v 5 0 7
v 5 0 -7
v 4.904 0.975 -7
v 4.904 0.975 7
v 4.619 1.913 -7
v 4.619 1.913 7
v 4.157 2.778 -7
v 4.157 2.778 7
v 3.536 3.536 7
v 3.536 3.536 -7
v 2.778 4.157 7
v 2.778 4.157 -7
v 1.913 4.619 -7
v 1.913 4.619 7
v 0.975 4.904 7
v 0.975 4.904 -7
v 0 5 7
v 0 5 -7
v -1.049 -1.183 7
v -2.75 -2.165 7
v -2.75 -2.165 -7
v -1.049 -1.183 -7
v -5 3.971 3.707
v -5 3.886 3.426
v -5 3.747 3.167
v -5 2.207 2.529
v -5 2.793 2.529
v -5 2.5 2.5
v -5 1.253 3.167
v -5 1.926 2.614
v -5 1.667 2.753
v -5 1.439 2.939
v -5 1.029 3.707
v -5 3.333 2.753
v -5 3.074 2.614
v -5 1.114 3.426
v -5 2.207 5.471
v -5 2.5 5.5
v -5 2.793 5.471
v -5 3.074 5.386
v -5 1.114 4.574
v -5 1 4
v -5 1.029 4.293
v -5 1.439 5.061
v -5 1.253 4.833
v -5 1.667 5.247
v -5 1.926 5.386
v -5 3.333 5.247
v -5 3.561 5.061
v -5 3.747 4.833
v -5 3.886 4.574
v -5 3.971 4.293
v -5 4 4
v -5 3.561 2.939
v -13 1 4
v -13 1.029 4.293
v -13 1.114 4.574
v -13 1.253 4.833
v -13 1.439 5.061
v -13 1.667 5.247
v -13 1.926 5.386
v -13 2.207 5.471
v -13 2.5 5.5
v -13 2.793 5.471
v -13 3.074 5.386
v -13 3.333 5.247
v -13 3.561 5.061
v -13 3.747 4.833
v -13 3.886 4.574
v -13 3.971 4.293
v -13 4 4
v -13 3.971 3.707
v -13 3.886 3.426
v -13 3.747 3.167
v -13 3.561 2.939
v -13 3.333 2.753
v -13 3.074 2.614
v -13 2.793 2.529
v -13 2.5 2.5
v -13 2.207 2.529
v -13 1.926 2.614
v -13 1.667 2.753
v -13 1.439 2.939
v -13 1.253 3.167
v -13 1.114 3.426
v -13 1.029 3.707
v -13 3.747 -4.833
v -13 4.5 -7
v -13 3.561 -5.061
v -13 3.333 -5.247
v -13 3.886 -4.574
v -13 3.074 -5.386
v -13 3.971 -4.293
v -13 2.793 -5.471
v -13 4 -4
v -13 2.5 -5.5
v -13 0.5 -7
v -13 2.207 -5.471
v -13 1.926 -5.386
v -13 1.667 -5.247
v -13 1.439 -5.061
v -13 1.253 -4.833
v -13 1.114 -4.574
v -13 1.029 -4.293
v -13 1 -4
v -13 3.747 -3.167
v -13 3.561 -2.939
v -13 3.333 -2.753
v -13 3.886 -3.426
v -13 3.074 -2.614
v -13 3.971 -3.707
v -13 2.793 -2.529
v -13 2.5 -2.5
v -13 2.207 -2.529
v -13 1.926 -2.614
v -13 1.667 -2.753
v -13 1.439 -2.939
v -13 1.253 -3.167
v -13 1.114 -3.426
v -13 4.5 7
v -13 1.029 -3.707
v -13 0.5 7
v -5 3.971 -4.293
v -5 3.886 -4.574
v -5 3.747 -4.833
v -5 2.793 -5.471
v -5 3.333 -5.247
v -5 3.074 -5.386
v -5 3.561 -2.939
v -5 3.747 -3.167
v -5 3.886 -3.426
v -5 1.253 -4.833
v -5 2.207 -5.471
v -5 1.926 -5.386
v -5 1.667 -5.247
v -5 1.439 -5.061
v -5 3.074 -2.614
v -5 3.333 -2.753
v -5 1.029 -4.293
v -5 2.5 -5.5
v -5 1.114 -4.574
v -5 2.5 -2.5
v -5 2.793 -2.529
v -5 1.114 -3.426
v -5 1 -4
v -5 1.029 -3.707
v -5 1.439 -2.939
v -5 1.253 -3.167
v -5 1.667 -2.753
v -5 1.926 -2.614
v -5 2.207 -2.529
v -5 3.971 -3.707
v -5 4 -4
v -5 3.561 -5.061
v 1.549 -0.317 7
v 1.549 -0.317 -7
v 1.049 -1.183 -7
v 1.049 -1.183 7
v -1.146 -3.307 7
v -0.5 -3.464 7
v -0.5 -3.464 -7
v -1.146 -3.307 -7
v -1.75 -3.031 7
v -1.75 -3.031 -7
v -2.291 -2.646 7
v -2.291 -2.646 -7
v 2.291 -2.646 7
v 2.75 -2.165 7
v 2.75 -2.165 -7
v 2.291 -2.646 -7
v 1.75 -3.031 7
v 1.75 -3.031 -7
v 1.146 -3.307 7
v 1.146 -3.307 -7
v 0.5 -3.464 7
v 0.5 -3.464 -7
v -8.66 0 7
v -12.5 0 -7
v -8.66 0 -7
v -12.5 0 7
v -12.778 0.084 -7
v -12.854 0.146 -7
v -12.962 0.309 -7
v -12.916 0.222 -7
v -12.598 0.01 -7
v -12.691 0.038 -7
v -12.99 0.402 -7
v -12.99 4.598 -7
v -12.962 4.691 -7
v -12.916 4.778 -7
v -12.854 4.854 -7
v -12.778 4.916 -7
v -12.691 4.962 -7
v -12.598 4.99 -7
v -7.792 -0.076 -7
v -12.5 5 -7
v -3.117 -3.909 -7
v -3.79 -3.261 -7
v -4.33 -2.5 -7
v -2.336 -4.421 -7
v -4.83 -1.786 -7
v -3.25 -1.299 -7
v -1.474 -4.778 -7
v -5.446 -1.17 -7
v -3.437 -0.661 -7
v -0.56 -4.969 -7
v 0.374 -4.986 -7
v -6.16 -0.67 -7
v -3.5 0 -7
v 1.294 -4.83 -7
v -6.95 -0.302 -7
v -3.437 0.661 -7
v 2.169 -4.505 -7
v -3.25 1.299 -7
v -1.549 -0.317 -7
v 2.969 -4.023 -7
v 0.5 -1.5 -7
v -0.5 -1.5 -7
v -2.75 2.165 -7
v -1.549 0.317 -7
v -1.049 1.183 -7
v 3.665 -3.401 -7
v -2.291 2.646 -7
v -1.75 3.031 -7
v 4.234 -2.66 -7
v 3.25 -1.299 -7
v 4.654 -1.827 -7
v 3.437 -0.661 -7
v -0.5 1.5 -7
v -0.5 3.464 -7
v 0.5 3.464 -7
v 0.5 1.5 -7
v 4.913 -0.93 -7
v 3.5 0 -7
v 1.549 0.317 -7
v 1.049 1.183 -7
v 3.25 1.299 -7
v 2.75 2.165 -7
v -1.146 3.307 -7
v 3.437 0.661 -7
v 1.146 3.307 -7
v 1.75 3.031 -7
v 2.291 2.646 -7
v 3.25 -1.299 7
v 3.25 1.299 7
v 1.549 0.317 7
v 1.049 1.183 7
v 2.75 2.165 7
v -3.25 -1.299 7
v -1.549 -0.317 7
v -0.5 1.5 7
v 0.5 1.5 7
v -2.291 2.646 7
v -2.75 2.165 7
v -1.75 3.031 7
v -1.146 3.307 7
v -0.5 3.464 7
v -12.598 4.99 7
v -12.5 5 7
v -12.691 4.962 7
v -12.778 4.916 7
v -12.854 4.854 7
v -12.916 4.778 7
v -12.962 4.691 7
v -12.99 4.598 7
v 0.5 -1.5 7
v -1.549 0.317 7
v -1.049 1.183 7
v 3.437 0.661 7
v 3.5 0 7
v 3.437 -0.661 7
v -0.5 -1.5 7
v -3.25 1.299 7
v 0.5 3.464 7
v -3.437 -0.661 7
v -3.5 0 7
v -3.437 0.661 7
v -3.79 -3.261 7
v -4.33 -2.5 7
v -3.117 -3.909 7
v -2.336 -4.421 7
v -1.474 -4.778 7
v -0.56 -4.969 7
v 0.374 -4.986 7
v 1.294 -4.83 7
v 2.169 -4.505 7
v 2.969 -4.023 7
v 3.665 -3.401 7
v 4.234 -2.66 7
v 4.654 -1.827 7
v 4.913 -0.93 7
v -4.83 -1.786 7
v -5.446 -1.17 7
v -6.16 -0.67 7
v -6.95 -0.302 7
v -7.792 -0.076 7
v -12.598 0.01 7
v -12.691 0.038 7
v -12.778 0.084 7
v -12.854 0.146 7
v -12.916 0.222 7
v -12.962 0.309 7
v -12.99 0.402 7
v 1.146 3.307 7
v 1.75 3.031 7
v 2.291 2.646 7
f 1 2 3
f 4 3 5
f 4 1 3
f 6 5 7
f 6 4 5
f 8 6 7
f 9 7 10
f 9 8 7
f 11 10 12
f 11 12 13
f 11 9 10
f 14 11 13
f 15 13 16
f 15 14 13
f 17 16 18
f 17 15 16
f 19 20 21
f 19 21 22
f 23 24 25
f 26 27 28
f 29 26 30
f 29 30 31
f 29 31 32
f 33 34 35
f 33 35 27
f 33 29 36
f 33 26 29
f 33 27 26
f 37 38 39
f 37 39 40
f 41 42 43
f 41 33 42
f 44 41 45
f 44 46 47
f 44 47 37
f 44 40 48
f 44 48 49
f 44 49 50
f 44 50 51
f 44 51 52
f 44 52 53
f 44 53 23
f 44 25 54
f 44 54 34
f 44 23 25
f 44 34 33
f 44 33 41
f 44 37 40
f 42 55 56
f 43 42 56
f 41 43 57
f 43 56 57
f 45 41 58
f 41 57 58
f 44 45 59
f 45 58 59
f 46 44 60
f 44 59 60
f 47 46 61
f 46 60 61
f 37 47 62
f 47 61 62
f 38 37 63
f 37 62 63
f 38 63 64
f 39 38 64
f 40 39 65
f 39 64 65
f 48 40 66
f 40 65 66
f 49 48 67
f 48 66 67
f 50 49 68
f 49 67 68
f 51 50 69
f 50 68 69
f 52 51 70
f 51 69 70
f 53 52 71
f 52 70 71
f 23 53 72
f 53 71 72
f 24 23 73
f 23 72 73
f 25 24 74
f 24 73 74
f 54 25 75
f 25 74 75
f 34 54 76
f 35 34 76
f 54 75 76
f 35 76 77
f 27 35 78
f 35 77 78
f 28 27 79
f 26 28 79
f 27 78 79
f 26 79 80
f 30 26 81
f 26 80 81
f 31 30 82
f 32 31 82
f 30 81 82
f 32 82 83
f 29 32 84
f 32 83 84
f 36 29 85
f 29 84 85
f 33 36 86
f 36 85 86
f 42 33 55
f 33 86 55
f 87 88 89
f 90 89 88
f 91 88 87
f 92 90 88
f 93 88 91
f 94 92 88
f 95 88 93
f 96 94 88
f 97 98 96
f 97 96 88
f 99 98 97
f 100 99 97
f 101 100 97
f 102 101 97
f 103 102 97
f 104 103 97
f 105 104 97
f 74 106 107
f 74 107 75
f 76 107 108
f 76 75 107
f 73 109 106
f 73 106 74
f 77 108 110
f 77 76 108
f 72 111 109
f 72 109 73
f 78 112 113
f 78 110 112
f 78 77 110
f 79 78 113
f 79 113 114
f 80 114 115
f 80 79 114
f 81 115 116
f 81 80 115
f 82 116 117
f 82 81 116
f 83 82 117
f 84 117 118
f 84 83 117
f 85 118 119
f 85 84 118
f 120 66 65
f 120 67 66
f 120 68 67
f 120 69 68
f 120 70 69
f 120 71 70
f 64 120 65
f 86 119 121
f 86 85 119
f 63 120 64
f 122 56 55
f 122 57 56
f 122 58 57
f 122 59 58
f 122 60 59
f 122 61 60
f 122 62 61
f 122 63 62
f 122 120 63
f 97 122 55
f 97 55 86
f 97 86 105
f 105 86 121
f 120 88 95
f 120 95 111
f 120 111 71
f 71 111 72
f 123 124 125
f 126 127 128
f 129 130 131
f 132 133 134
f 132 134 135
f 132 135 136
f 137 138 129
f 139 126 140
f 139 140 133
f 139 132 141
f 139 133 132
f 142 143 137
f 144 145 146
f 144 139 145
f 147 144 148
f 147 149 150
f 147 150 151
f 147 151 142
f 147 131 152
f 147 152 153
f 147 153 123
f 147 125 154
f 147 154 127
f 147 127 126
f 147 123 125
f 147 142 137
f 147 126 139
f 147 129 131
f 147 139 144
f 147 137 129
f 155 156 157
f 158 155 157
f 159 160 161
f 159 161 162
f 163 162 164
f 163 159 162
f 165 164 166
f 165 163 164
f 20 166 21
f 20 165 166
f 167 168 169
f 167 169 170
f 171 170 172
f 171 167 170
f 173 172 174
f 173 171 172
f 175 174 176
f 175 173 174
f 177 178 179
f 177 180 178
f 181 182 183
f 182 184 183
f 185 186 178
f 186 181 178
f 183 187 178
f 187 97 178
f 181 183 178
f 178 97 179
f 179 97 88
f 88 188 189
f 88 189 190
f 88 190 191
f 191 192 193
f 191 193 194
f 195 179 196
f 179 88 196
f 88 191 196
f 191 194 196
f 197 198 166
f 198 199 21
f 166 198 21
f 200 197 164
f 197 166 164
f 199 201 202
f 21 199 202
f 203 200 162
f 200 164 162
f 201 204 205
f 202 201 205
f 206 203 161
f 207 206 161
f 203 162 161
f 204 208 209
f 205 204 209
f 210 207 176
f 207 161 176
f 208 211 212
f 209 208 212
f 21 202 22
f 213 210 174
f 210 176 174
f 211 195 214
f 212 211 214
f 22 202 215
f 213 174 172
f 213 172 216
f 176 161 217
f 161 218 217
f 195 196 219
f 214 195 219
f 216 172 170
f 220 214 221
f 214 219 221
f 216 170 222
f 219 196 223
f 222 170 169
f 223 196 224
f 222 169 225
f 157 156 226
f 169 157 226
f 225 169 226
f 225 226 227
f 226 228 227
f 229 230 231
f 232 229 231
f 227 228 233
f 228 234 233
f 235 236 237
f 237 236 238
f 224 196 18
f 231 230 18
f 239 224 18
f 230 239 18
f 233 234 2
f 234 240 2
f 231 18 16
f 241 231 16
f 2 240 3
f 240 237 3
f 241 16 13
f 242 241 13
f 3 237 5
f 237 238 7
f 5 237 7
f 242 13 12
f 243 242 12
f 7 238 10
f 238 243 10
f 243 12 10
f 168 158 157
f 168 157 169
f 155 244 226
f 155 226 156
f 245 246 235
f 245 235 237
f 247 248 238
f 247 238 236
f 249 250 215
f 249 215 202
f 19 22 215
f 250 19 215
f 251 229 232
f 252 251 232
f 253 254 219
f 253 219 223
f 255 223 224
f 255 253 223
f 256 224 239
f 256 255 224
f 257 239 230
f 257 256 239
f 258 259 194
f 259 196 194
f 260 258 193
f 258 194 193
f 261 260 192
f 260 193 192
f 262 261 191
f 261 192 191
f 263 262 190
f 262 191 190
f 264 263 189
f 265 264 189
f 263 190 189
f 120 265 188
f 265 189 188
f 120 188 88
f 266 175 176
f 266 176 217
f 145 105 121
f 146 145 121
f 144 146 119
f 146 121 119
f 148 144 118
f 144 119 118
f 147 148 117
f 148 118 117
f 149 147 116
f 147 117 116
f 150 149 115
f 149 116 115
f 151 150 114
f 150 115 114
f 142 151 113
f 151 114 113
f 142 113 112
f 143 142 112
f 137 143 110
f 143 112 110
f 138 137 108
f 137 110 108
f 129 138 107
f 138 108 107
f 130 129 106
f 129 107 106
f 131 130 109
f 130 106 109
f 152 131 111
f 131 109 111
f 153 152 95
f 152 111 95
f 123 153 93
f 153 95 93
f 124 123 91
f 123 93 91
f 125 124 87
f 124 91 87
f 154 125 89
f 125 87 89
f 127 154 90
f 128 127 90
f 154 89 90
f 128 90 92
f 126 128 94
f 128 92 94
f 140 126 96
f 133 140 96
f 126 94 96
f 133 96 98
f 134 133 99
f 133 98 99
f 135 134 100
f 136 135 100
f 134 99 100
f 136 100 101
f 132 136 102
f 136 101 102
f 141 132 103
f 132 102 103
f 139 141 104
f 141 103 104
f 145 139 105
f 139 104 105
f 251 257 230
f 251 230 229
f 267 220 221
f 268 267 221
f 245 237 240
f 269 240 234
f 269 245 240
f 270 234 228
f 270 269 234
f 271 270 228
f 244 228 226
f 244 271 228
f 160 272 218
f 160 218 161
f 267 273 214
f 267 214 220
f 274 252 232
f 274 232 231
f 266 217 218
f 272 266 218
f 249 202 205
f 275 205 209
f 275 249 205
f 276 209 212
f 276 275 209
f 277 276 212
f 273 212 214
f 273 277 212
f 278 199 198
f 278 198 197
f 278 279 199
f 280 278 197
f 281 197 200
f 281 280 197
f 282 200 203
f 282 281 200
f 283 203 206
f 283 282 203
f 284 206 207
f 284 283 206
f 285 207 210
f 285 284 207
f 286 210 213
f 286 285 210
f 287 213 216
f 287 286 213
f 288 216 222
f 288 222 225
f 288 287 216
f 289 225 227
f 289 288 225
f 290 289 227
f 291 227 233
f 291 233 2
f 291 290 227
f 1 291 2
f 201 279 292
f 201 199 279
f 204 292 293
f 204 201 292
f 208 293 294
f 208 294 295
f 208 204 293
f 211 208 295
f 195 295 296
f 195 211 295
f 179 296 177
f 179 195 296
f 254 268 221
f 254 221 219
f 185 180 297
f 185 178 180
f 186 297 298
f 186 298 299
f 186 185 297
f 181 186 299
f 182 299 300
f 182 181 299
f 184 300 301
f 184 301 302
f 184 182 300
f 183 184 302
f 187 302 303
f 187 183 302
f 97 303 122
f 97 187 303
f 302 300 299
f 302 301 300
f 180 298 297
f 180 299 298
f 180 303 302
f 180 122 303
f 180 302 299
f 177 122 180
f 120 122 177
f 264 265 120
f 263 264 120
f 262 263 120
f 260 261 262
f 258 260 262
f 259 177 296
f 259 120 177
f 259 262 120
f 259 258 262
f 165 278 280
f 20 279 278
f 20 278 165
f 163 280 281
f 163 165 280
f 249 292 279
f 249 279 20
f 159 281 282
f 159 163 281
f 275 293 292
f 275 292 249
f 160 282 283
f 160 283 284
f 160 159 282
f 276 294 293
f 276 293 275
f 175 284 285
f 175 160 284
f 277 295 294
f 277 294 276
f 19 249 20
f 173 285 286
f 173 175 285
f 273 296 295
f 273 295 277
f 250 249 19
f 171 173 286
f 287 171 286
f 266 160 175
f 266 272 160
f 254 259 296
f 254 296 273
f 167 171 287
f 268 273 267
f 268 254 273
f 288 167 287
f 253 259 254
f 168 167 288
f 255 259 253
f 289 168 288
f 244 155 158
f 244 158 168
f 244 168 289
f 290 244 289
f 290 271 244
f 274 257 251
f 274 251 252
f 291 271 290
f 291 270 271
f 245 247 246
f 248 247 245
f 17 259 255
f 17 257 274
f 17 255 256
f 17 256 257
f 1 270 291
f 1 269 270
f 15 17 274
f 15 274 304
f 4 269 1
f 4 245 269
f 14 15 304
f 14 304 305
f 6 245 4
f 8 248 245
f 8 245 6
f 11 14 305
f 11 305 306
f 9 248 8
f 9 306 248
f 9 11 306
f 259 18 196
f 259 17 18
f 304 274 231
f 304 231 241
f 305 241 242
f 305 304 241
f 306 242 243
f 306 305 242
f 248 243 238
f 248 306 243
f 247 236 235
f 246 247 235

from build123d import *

# Parameters (mm, degrees)
F1_DEPTH = 7
F2_R     = 5
F3_R     = 0.5
F4_R     = 1.5
F5_DEPTH = 8


with BuildPart() as f1:
    # F0 (on Top) → F1 (new body, symmetric)
    with BuildSketch(Plane.XY):
        with BuildLine():
            ThreePointArc((-5, 0), (0, -5), (5, 0))
            ThreePointArc((5, 0), (3.535534, 3.535534), (0, 5))
            ThreePointArc((0, 5), (-3.535534, 3.535534), (-5, 0))
        make_face()
        with BuildLine():
            ThreePointArc((-2.75, 2.165064), (-1.75, 3.031089), (-0.5, 3.464102))
            ThreePointArc((-0.5, 3.464102), (0, 3.5), (0.5, 3.464102))
            ThreePointArc((0.5, 3.464102), (1.75, 3.031089), (2.75, 2.165064))
            Line((2.75, 2.165064), (1.049038, 1.183013))
            Line((1.049038, 1.183013), (1.549038, 0.316987))
            Line((1.549038, 0.316987), (3.25, 1.299038))
            ThreePointArc((3.25, 1.299038), (3.5, 0), (3.25, -1.299038))
            ThreePointArc((3.25, -1.299038), (3.031089, -1.75), (2.75, -2.165064))
            ThreePointArc((2.75, -2.165064), (1.75, -3.031089), (0.5, -3.464102))
            ThreePointArc((0.5, -3.464102), (0, -3.5), (-0.5, -3.464102))
            ThreePointArc((-0.5, -3.464102), (-1.75, -3.031089), (-2.75, -2.165064))
            ThreePointArc((-2.75, -2.165064), (-3.031089, -1.75), (-3.25, -1.299038))
            ThreePointArc((-3.25, -1.299038), (-3.5, 0), (-3.25, 1.299038))
            ThreePointArc((-3.25, 1.299038), (-3.031089, 1.75), (-2.75, 2.165064))
        make_face(mode=Mode.SUBTRACT)
        with BuildLine():
            Line((-1.049038, 1.183013), (-2.75, 2.165064))
            ThreePointArc((-2.75, 2.165064), (-3.031089, 1.75), (-3.25, 1.299038))
            Line((-3.25, 1.299038), (-1.549038, 0.316987))
            Line((-1.549038, 0.316987), (-1.049038, 1.183013))
        make_face()
        with BuildLine():
            ThreePointArc((0.5, 3.464102), (0, 3.5), (-0.5, 3.464102))
            Line((-0.5, 3.464102), (-0.5, 1.5))
            Line((-0.5, 1.5), (0.5, 1.5))
            Line((0.5, 1.5), (0.5, 3.464102))
        make_face()
        with BuildLine():
            Line((-1.549038, -0.316987), (-3.25, -1.299038))
            ThreePointArc((-3.25, -1.299038), (-3.031089, -1.75), (-2.75, -2.165064))
            Line((-2.75, -2.165064), (-1.049038, -1.183013))
            Line((-1.049038, -1.183013), (-1.549038, -0.316987))
        make_face()
        with BuildLine():
            Line((-0.5, -1.5), (-0.5, -3.464102))
            ThreePointArc((-0.5, -3.464102), (0, -3.5), (0.5, -3.464102))
            Line((0.5, -3.464102), (0.5, -1.5))
            Line((0.5, -1.5), (-0.5, -1.5))
        make_face()
        with BuildLine():
            ThreePointArc((2.75, -2.165064), (3.031089, -1.75), (3.25, -1.299038))
            Line((3.25, -1.299038), (1.549038, -0.316987))
            Line((1.549038, -0.316987), (1.049038, -1.183013))
            Line((1.049038, -1.183013), (2.75, -2.165064))
        make_face()
        with BuildLine():
            ThreePointArc((-5, 0), (-3.535534, 3.535534), (0, 5))
            Line((0, 5), (-13, 5))
            Line((-13, 5), (-13, 0))
            Line((-13, 0), (-5, 0))
        make_face()
    extrude(amount=F1_DEPTH, both=True)

    # F2
    f2_edges = [f1.edges().sort_by_distance(p)[0] for p in [
        (-5, 0, 0),
    ]]
    fillet(f2_edges, radius=F2_R)

    # F3
    f3_edges = [f1.edges().sort_by_distance(p)[0] for p in [
        (-13, 5, 0),
        (-13, 0, 0),
    ]]
    fillet(f3_edges, radius=F3_R)

    # F4 (on face) → F5 (cut)
    with BuildSketch(Plane(origin=(-13, 0, 0), x_dir=(0, -1, 0), z_dir=(-1, 0, 0))):
        with Locations((-2.5, 4)):
            Circle(F4_R)
        with Locations((-2.5, -4)):
            Circle(F4_R)
    extrude(amount=-F5_DEPTH, mode=Mode.SUBTRACT)


solid = f1.part
